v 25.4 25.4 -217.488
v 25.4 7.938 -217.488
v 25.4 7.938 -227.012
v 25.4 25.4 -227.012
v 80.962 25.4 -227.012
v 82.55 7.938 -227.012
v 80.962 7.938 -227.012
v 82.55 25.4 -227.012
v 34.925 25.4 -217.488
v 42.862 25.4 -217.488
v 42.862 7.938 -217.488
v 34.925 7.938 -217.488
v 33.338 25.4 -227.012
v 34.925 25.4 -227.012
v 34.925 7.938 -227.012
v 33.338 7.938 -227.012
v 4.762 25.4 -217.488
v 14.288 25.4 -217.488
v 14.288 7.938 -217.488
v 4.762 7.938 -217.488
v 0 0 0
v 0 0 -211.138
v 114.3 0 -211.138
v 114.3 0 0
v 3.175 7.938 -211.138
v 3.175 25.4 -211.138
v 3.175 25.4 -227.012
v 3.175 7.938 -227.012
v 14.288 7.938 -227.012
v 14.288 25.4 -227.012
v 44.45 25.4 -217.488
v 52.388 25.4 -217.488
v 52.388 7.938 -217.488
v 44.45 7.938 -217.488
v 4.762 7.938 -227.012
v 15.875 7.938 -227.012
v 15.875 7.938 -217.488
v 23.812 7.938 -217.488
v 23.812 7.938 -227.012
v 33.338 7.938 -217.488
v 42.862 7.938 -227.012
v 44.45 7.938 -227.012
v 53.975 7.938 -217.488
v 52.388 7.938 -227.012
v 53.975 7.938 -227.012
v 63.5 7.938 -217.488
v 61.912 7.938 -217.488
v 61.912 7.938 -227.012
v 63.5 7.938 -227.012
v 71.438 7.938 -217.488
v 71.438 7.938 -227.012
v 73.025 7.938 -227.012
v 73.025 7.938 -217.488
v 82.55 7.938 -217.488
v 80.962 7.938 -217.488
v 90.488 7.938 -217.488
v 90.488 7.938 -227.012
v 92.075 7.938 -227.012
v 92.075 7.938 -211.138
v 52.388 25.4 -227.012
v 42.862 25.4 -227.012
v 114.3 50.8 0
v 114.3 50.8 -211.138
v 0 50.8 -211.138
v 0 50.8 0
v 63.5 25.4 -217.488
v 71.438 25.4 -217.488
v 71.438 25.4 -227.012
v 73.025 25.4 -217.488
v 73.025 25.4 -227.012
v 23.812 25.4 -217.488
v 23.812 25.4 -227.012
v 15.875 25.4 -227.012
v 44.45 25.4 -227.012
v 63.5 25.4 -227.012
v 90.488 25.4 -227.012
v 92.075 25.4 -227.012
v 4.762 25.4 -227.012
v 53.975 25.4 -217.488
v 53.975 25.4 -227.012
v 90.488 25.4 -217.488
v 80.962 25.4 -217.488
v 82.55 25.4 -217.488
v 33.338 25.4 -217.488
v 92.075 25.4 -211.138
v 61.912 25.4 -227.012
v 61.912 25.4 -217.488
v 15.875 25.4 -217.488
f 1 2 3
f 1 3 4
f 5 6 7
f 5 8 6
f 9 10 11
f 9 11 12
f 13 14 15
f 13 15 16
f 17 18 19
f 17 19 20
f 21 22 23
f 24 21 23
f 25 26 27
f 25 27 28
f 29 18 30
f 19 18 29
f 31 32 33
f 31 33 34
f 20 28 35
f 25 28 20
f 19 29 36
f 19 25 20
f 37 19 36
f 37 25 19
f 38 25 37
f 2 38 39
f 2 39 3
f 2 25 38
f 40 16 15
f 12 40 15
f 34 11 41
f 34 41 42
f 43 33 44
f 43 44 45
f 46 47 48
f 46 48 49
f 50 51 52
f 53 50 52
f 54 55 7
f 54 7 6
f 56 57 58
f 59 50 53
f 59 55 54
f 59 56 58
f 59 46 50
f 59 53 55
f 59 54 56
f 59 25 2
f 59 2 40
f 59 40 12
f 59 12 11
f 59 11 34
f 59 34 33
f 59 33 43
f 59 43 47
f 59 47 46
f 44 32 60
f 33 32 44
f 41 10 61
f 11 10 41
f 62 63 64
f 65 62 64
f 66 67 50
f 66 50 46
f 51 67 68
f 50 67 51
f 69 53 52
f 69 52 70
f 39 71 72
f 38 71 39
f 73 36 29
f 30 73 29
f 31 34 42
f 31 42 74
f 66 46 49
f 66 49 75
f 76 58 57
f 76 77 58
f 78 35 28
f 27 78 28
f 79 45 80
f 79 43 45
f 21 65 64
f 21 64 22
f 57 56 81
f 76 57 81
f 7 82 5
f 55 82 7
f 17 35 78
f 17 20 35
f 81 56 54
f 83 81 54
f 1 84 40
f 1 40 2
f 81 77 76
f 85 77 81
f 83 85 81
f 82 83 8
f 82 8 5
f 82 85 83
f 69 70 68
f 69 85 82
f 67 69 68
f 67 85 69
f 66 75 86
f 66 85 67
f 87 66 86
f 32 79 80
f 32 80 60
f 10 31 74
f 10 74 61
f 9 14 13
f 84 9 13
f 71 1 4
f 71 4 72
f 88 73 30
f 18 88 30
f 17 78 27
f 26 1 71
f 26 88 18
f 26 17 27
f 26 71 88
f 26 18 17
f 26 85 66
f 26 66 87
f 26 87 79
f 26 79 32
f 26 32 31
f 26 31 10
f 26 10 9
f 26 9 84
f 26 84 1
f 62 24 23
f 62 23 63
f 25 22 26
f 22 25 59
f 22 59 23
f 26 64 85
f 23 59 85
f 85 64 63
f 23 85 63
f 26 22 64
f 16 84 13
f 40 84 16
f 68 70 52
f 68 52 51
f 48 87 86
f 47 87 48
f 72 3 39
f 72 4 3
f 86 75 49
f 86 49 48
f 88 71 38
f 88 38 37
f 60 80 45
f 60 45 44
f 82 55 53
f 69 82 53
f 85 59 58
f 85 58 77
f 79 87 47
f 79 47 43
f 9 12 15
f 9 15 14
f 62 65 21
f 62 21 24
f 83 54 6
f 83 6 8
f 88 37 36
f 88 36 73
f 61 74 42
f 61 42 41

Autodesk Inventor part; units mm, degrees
ref_plane "YZ Plane" through (0, 0, 0) normal (1, 0, 0) x (0, 1, 0)
ref_plane "XZ Plane" through (0, 0, 0) normal (0, 1, 0) x (-1, 0, 0)
ref_plane "XY Plane" through (0, 0, 0) normal (0, 0, 1) x (1, 0, 0)
sketch "Sketch1" plane through (0, 0, 0) normal (0, 0, 1) x (1, 0, 0)
  line L0 (0, 0) -> (114.3, 0)
  line L1 (114.3, 0) -> (114.3, 50.8)
  line L2 (114.3, 50.8) -> (0, 50.8)
  line L3 (0, 50.8) -> (0, 0)
  dimension "d0" = 114.3
  dimension "d1" = 50.8
extrude "Extrusion1" add sketch "Sketch1" against normal blind 211.1375
sketch "Sketch2" plane through (0, 0, -211.1375) normal (0, 0, -1) x (-1, 0, 0)
  line L0 (-114.3, 0) -> (0, 0) projected
  line L1 (0, 0) -> (0, 50.8) projected
  line L2 (0, 50.8) -> (-114.3, 50.8) projected
  line L3 (-114.3, 50.8) -> (-114.3, 0) projected
  line L4 (-3.175, 7.9375) -> (-92.075, 7.9375)
  line L5 (-92.075, 7.9375) -> (-92.075, 25.4)
  line L6 (-92.075, 25.4) -> (-3.175, 25.4)
  line L7 (-3.175, 25.4) -> (-3.175, 7.9375)
  line L8 (-82.55, 25.4) -> (-80.9625, 25.4)
  line L9 (-80.9625, 25.4) -> (-80.9625, 7.9375)
  line L10 (-80.9625, 7.9375) -> (-82.55, 7.9375)
  line L11 (-82.55, 7.9375) -> (-82.55, 25.4)
  line L12 (-73.025, 25.4) -> (-71.4375, 25.4)
  line L13 (-71.4375, 25.4) -> (-71.4375, 7.9375)
  line L14 (-71.4375, 7.9375) -> (-73.025, 7.9375)
  line L15 (-73.025, 7.9375) -> (-73.025, 25.4)
  line L16 (-63.5, 25.4) -> (-61.9125, 25.4)
  line L17 (-61.9125, 25.4) -> (-61.9125, 7.9375)
  line L18 (-61.9125, 7.9375) -> (-63.5, 7.9375)
  line L19 (-63.5, 7.9375) -> (-63.5, 25.4)
  line L20 (-53.975, 25.4) -> (-52.3875, 25.4)
  line L21 (-52.3875, 25.4) -> (-52.3875, 7.9375)
  line L22 (-52.3875, 7.9375) -> (-53.975, 7.9375)
  line L23 (-53.975, 7.9375) -> (-53.975, 25.4)
  line L24 (-44.45, 25.4) -> (-42.8625, 25.4)
  line L25 (-42.8625, 25.4) -> (-42.8625, 7.9375)
  line L26 (-42.8625, 7.9375) -> (-44.45, 7.9375)
  line L27 (-44.45, 7.9375) -> (-44.45, 25.4)
  line L28 (-34.925, 25.4) -> (-33.3375, 25.4)
  line L29 (-33.3375, 25.4) -> (-33.3375, 7.9375)
  line L30 (-33.3375, 7.9375) -> (-34.925, 7.9375)
  line L31 (-34.925, 7.9375) -> (-34.925, 25.4)
  line L32 (-25.4, 25.4) -> (-23.8125, 25.4)
  line L33 (-23.8125, 25.4) -> (-23.8125, 7.9375)
  line L34 (-23.8125, 7.9375) -> (-25.4, 7.9375)
  line L35 (-25.4, 7.9375) -> (-25.4, 25.4)
  line L36 (-15.875, 25.4) -> (-14.2875, 25.4)
  line L37 (-14.2875, 25.4) -> (-14.2875, 7.9375)
  line L38 (-14.2875, 7.9375) -> (-15.875, 7.9375)
  line L39 (-15.875, 7.9375) -> (-15.875, 25.4)
  line L40 (-4.7625, 25.4) -> (-3.175, 25.4)
  line L41 (-3.175, 25.4) -> (-3.175, 7.9375)
  line L42 (-3.175, 7.9375) -> (-4.7625, 7.9375)
  line L43 (-4.7625, 7.9375) -> (-4.7625, 25.4)
  line L44 (-90.4875, 25.4) -> (-92.075, 25.4)
  line L45 (-92.075, 25.4) -> (-92.075, 7.9375)
  line L46 (-92.075, 7.9375) -> (-90.4875, 7.9375)
  line L47 (-90.4875, 7.9375) -> (-90.4875, 25.4)
  dimension "d4" = 3.175
  dimension "d5" = 7.9375
  dimension "d6" = 22.225
  dimension "d7" = 25.4
  dimension "d8" = 1.5875
  dimension "d9" = 7.9375
  dimension "d10" = 1.5875
  dimension "d11" = 7.9375
  dimension "d12" = 1.5875
  dimension "d13" = 7.9375
  dimension "d14" = 1.5875
  dimension "d15" = 7.9375
  dimension "d16" = 1.5875
  dimension "d17" = 7.9375
  dimension "d18" = 1.5875
  dimension "d19" = 1.5875
  dimension "d21" = 1.5875
  dimension "d23" = 1.5875
  dimension "d24" = 7.9375
  dimension "d25" = 1.5875
  dimension "d26" = 7.9375
  dimension "d27" = 7.9375
extrude "Extrusion2" add sketch "Sketch2" along normal blind 15.875 contours L4 L43 L6 L7 | L4 L39 L6 L37 | L4 L35 L6 L33 | L4 L31 L6 L29 | L4 L27 L6 L25 | L4 L23 L6 L21 | L4 L19 L6 L17 | L4 L15 L6 L13 | L4 L11 L6 L9 | L4 L5 L6 L47
sketch "Sketch3" plane through (0, 0, -211.1375) normal (0, 0, -1) x (-1, 0, 0)
  line L0 (-71.4375, 7.9375) -> (-73.025, 7.9375) projected
  line L1 (-73.025, 7.9375) -> (-73.025, 25.4) projected
  line L2 (-52.3875, 7.9375) -> (-53.975, 7.9375) projected
  line L3 (-53.975, 7.9375) -> (-53.975, 25.4) projected
  line L4 (-33.3375, 7.9375) -> (-34.925, 7.9375) projected
  line L5 (-34.925, 7.9375) -> (-34.925, 25.4) projected
  line L6 (-23.8125, 7.9375) -> (-25.4, 7.9375) projected
  line L7 (-25.4, 7.9375) -> (-25.4, 25.4) projected
  line L8 (-14.2875, 7.9375) -> (-15.875, 7.9375) projected
  line L9 (-15.875, 7.9375) -> (-15.875, 25.4) projected
  line L10 (-42.8625, 7.9375) -> (-44.45, 7.9375) projected
  line L11 (-44.45, 7.9375) -> (-44.45, 25.4) projected
  line L12 (-61.9125, 7.9375) -> (-63.5, 7.9375) projected
  line L13 (-63.5, 7.9375) -> (-63.5, 25.4) projected
  line L14 (-80.9625, 7.9375) -> (-82.55, 7.9375) projected
  line L15 (-82.55, 7.9375) -> (-82.55, 25.4) projected
  line L16 (-92.075, 25.4) -> (-3.175, 25.4)
  line L17 (-3.175, 25.4) -> (-3.175, 7.9375)
  line L18 (-3.175, 7.9375) -> (-92.075, 7.9375)
  line L19 (-92.075, 7.9375) -> (-92.075, 25.4)
  line L20 (-90.4875, 7.9375) -> (-92.075, 7.9375)
  line L21 (-92.075, 7.9375) -> (-92.075, 25.4)
  line L22 (-92.075, 25.4) -> (-90.4875, 25.4)
  line L23 (-90.4875, 25.4) -> (-90.4875, 7.9375)
  line L24 (-82.55, 25.4) -> (-80.9625, 25.4)
  line L25 (-80.9625, 25.4) -> (-80.9625, 7.9375)
  line L26 (-80.9625, 7.9375) -> (-82.55, 7.9375)
  line L27 (-82.55, 7.9375) -> (-82.55, 25.4)
  line L28 (-73.025, 25.4) -> (-71.4375, 25.4)
  line L29 (-71.4375, 25.4) -> (-71.4375, 7.9375)
  line L30 (-71.4375, 7.9375) -> (-73.025, 7.9375)
  line L31 (-73.025, 7.9375) -> (-73.025, 25.4)
  line L32 (-63.5, 25.4) -> (-61.9125, 25.4)
  line L33 (-61.9125, 25.4) -> (-61.9125, 7.9375)
  line L34 (-61.9125, 7.9375) -> (-63.5, 7.9375)
  line L35 (-63.5, 7.9375) -> (-63.5, 25.4)
  line L36 (-53.975, 25.4) -> (-52.3875, 25.4)
  line L37 (-52.3875, 25.4) -> (-52.3875, 7.9375)
  line L38 (-52.3875, 7.9375) -> (-53.975, 7.9375)
  line L39 (-53.975, 7.9375) -> (-53.975, 25.4)
  line L40 (-44.45, 25.4) -> (-42.8625, 25.4)
  line L41 (-42.8625, 25.4) -> (-42.8625, 7.9375)
  line L42 (-42.8625, 7.9375) -> (-44.45, 7.9375)
  line L43 (-44.45, 7.9375) -> (-44.45, 25.4)
  line L44 (-34.925, 25.4) -> (-33.3375, 25.4)
  line L45 (-33.3375, 25.4) -> (-33.3375, 7.9375)
  line L46 (-33.3375, 7.9375) -> (-34.925, 7.9375)
  line L47 (-34.925, 7.9375) -> (-34.925, 25.4)
  line L48 (-25.4, 25.4) -> (-23.8125, 25.4)
  line L49 (-23.8125, 25.4) -> (-23.8125, 7.9375)
  line L50 (-23.8125, 7.9375) -> (-25.4, 7.9375)
  line L51 (-25.4, 7.9375) -> (-25.4, 25.4)
  line L52 (-15.875, 25.4) -> (-14.2875, 25.4)
  line L53 (-14.2875, 25.4) -> (-14.2875, 7.9375)
  line L54 (-14.2875, 7.9375) -> (-15.875, 7.9375)
  line L55 (-15.875, 7.9375) -> (-15.875, 25.4)
  line L56 (-4.7625, 25.4) -> (-3.175, 25.4)
  line L57 (-3.175, 25.4) -> (-3.175, 7.9375)
  line L58 (-3.175, 7.9375) -> (-4.7625, 7.9375)
  line L59 (-4.7625, 7.9375) -> (-4.7625, 25.4)
extrude "Extrusion3" add sketch "Sketch3" along normal blind 6.35 contours L29 L16 L13 L18 | L18 L25 L16 L1 | L33 L16 L3 L18 | L18 L23 L16 L15 | L37 L16 L11 L18 | L41 L16 L5 L18 | L45 L16 L7 L18 | L49 L16 L9 L18 | L53 L16 L59 L18
properties part number "powerSupply"
